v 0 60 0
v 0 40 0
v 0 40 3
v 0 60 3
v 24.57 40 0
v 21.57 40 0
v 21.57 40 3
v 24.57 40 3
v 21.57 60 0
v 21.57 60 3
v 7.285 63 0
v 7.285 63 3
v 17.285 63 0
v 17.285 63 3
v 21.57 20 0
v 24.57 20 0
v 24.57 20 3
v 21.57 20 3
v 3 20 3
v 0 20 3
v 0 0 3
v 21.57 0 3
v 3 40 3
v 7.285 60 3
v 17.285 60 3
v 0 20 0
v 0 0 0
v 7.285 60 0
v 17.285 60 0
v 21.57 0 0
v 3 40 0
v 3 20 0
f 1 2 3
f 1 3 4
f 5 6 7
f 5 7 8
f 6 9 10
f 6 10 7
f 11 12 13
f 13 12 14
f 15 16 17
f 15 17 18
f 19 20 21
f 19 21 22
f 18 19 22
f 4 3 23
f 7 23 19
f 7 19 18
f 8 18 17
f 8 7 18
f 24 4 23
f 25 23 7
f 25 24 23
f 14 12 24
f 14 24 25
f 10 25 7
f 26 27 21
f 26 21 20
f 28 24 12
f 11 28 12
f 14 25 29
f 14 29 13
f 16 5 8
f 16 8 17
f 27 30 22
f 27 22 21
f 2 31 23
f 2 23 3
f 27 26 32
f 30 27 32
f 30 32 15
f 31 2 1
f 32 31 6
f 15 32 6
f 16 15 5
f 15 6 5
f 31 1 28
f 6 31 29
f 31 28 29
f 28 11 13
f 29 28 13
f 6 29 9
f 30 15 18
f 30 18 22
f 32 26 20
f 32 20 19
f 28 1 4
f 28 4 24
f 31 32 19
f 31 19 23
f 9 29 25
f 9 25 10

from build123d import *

# Parameters (mm, degrees)
PLATE_THICKNESS_3MM_DEPTH = 3
SKETCH_1_W                = 3.5
SKETCH_1_H                = 3
EXTRUDE_2_DEPTH           = 3


with BuildPart() as part:
    # Sketch1 → Plate_thickness_3mm (new body)
    with BuildSketch(Plane.XY):
        Polygon((21.57, 0), (0, 0), (0, 20), (3, 20), (3, 40), (0, 40), (0, 60), (10.785, 60), (10.785, 63), (13.785, 63), (13.785, 60), (21.57, 60), (21.57, 40), (24.57, 40), (24.57, 20), (21.57, 20), align=None)
    extrude(amount=PLATE_THICKNESS_3MM_DEPTH)

    # 草图1 → 凸台-拉伸2 (add)
    with BuildSketch(Plane.XY.offset(3)):
        with Locations((9.035, 61.5)):
            Rectangle(SKETCH_1_W, SKETCH_1_H)
        with Locations((15.535, 61.5)):
            Rectangle(SKETCH_1_W, SKETCH_1_H)
    extrude(amount=-EXTRUDE_2_DEPTH)


solid = part.part
